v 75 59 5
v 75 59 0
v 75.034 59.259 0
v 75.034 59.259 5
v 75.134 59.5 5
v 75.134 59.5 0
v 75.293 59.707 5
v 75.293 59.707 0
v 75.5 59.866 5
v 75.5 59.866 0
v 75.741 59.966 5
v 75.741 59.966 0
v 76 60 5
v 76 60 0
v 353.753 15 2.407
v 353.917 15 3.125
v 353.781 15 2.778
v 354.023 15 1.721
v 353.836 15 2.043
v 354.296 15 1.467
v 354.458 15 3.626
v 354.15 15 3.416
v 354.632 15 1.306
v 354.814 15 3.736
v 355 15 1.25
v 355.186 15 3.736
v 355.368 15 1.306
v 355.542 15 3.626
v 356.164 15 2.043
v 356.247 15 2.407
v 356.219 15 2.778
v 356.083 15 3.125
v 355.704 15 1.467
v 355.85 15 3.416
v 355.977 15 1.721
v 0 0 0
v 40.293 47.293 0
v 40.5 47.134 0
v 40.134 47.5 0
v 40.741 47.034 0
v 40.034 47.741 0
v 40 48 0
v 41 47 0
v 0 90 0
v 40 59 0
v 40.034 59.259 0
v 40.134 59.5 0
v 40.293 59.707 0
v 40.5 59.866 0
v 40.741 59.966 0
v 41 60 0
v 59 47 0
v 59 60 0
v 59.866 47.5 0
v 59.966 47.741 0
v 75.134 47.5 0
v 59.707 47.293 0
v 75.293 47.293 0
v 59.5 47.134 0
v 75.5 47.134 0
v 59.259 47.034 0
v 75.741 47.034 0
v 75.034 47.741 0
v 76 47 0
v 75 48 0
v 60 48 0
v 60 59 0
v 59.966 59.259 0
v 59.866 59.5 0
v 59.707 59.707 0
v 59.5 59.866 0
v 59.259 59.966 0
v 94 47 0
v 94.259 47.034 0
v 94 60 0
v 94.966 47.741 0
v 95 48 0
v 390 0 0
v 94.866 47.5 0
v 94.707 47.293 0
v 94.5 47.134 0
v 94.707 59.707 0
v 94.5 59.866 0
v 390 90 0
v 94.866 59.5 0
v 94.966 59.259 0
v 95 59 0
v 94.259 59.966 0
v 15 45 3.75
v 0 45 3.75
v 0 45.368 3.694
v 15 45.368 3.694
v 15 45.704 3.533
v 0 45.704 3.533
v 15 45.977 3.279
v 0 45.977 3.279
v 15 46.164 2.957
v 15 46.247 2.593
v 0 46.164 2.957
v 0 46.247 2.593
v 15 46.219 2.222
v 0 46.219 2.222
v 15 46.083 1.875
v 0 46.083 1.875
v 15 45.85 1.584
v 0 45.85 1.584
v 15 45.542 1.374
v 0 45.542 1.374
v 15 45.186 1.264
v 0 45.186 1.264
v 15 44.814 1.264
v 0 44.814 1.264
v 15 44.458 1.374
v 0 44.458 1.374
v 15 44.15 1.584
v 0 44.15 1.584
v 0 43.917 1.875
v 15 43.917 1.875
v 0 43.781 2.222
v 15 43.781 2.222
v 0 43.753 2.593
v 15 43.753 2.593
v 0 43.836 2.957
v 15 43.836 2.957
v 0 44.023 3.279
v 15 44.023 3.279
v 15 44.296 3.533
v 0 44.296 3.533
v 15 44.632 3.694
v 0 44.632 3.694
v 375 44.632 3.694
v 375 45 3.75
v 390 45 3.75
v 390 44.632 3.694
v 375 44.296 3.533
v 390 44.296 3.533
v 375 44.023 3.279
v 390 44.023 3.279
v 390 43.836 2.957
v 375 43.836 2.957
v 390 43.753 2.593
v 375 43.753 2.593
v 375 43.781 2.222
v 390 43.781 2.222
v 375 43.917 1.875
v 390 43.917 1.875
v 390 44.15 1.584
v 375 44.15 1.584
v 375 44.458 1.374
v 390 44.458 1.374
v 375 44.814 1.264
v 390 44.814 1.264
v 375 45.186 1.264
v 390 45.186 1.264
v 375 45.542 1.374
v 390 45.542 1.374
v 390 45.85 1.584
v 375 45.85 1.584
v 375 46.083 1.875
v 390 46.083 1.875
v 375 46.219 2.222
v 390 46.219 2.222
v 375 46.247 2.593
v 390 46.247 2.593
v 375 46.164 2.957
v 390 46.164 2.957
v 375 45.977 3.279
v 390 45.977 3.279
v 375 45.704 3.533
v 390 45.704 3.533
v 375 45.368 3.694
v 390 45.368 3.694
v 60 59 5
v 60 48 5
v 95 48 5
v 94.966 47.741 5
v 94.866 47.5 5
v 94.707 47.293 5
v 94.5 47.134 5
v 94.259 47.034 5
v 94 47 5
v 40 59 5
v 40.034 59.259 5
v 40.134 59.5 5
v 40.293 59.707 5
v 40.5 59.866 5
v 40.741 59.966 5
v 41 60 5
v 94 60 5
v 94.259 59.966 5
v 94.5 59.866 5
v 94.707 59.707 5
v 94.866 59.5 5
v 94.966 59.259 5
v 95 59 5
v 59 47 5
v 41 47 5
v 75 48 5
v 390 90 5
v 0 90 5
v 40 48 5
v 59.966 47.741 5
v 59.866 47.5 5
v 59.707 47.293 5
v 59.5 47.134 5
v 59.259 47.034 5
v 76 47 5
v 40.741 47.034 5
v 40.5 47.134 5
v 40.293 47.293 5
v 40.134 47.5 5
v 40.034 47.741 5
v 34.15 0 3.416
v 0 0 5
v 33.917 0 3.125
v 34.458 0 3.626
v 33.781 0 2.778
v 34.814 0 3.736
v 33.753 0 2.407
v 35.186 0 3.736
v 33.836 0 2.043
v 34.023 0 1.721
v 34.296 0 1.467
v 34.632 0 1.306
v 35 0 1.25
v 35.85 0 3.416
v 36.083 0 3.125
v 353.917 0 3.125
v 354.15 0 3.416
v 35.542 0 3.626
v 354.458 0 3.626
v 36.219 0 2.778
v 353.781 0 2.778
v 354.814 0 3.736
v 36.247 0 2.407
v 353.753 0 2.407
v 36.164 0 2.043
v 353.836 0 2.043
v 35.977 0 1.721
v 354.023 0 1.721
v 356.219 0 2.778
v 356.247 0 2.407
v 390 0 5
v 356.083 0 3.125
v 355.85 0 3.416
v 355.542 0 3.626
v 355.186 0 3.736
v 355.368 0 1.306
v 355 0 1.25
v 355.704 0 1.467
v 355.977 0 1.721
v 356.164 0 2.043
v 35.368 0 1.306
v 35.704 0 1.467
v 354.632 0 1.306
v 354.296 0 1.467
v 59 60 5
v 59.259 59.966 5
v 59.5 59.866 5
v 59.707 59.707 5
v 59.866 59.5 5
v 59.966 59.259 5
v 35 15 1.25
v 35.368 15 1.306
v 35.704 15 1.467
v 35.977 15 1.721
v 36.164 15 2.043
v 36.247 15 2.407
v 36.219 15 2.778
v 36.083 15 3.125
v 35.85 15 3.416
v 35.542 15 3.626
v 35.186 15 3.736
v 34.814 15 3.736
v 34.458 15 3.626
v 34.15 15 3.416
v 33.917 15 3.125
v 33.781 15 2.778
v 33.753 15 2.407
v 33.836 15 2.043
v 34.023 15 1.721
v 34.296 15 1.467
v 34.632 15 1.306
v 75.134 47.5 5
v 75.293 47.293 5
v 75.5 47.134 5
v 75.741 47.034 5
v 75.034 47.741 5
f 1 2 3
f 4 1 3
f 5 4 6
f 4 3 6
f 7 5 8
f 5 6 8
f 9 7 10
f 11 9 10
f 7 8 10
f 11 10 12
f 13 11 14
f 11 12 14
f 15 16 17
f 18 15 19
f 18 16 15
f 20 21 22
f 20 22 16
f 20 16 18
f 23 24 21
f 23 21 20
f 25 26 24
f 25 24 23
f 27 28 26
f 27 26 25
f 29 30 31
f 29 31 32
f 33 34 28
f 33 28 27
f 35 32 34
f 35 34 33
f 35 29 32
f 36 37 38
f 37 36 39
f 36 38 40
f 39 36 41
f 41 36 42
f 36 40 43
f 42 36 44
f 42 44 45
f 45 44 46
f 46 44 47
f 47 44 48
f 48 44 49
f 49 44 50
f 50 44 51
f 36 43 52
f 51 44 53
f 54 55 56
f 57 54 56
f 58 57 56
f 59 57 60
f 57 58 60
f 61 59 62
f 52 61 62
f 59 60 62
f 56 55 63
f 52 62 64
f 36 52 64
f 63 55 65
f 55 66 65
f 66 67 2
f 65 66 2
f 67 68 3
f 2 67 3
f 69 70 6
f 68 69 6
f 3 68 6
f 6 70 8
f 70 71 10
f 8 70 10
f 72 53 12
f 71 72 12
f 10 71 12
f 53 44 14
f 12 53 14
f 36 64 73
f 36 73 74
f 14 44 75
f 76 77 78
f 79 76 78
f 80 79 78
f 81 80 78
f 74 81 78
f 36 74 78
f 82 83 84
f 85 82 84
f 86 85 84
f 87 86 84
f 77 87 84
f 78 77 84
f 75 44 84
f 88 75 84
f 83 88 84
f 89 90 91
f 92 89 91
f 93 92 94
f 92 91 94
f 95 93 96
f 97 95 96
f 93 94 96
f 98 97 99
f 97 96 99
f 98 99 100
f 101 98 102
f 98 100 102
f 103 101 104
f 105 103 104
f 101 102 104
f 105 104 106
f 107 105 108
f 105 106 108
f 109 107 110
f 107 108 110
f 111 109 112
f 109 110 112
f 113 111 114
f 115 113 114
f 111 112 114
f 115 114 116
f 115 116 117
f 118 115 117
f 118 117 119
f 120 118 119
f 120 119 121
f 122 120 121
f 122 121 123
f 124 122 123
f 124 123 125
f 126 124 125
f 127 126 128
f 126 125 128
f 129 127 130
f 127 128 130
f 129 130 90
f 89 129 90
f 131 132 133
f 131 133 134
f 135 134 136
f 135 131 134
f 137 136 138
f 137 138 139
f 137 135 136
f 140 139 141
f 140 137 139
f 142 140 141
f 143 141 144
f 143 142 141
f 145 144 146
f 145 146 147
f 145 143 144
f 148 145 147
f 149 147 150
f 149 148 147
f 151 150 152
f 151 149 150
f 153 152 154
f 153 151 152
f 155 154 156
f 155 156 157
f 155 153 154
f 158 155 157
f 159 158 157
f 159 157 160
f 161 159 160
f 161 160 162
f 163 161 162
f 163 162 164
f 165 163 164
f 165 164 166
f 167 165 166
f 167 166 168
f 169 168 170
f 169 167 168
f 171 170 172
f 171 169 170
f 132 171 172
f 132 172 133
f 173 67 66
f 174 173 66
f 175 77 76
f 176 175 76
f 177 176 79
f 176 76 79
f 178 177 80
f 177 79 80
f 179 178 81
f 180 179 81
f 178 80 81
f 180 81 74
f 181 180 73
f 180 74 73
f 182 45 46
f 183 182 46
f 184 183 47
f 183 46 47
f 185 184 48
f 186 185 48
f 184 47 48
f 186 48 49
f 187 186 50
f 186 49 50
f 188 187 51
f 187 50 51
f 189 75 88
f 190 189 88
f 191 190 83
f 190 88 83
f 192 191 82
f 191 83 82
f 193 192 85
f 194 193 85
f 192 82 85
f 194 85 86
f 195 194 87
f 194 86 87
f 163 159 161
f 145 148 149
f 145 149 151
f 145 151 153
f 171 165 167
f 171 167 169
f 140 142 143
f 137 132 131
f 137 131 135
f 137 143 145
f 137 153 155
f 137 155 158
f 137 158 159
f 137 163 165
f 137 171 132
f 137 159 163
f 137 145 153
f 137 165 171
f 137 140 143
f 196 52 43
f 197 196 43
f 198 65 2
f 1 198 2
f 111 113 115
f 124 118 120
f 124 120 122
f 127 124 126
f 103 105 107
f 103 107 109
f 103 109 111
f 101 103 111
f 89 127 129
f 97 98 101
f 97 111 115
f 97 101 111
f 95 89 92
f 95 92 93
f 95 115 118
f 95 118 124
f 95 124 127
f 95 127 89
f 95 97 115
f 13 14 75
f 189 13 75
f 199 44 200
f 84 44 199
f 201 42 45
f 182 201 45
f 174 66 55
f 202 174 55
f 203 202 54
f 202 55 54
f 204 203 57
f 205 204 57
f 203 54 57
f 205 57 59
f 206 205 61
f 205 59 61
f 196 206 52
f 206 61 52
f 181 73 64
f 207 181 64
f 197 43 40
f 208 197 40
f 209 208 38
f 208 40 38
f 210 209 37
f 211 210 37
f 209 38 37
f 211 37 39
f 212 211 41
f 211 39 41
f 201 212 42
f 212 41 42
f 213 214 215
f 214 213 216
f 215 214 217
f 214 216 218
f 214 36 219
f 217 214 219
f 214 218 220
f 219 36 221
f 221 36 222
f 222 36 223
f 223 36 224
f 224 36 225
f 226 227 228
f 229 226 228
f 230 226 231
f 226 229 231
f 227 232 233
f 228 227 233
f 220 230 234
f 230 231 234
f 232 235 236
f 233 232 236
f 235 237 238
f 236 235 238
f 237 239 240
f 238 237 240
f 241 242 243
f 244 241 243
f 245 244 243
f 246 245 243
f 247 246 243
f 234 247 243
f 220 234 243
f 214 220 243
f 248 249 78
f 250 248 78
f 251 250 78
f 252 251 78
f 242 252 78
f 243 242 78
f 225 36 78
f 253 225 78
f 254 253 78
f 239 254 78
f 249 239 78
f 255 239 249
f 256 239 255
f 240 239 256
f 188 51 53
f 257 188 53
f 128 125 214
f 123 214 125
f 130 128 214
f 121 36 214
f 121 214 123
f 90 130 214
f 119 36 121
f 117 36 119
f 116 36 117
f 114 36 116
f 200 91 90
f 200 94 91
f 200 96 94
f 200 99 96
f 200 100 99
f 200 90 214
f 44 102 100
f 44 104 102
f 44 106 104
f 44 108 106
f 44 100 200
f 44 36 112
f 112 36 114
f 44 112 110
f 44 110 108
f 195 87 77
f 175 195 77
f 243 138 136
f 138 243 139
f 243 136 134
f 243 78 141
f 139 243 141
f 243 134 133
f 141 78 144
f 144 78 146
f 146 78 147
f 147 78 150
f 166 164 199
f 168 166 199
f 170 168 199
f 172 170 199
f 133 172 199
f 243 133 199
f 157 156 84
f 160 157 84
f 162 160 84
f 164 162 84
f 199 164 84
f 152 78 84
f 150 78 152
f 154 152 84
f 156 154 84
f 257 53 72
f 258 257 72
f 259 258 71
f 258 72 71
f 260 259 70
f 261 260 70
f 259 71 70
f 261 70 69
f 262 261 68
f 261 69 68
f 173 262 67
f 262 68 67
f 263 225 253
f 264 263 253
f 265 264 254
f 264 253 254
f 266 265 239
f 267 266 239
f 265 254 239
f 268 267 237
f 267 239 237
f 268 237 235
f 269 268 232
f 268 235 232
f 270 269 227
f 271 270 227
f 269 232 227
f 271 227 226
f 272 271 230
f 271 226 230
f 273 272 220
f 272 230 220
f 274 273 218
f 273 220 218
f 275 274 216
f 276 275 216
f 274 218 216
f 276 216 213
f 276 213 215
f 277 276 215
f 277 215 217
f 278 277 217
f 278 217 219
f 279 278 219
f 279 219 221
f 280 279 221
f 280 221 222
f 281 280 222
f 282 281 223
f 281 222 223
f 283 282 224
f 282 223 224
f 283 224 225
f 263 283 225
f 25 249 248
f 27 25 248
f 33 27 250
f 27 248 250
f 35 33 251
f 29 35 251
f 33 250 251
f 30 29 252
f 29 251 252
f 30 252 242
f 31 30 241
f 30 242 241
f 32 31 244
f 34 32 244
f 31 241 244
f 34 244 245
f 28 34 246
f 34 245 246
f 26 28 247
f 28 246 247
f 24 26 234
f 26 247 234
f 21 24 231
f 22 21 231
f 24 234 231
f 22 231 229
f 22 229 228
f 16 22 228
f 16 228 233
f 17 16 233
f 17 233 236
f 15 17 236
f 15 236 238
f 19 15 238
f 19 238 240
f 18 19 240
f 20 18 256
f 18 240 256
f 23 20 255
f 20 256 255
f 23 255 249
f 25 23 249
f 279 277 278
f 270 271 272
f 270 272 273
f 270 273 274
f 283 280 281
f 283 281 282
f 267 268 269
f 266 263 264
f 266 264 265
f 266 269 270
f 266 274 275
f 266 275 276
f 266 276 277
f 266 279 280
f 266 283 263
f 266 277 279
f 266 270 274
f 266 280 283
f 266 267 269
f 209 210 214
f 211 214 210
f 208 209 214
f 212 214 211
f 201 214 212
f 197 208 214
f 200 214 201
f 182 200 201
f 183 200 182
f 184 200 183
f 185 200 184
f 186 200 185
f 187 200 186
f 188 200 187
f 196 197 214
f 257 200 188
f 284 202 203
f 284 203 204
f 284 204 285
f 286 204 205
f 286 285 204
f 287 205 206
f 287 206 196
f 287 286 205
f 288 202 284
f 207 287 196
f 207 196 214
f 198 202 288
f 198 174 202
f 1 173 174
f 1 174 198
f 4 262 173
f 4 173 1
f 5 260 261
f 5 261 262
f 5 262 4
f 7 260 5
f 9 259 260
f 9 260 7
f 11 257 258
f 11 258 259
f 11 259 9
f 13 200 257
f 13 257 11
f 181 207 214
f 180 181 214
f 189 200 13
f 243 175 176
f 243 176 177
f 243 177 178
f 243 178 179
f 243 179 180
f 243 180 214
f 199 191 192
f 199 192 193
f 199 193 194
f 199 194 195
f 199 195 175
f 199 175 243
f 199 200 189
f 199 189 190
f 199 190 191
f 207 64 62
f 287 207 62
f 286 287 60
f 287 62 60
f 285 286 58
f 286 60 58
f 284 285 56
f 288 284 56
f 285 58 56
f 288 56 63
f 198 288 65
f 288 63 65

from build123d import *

# Parameters (mm, degrees)
SKETCH1_W           = 390
SKETCH1_H           = 90
BOSS_EXTRUDE2_DEPTH = 5
SKETCH2_R           = 1.25
CUT_EXTRUDE1_DEPTH  = 15
CUT_EXTRUDE2_START  = -15
SKETCH3_R           = 1.25
CUT_EXTRUDE2_DEPTH  = 15
SKETCH4_R           = 1.25
CUT_EXTRUDE3_DEPTH  = 15


with BuildPart() as part:
    # Sketch1 → Boss-Extrude2 (new body)
    with BuildSketch(Plane.XY):
        with Locations((195, 45)):
            Rectangle(SKETCH1_W, SKETCH1_H)
        with BuildLine():
            Line((41, 60), (59, 60))
            ThreePointArc((59, 60), (59.707106781, 59.707106781), (60, 59))
            Line((60, 59), (60, 48))
            ThreePointArc((60, 48), (59.707106781, 47.292893219), (59, 47))
            Line((59, 47), (41, 47))
            ThreePointArc((41, 47), (40.292893219, 47.292893219), (40, 48))
            Line((40, 48), (40, 59))
            ThreePointArc((40, 59), (40.292893219, 59.707106781), (41, 60))
        make_face(mode=Mode.SUBTRACT)
        with BuildLine():
            Line((76, 60), (94, 60))
            ThreePointArc((94, 60), (94.707106781, 59.707106781), (95, 59))
            Line((95, 59), (95, 48))
            ThreePointArc((95, 48), (94.707106781, 47.292893219), (94, 47))
            Line((94, 47), (76, 47))
            ThreePointArc((76, 47), (75.292893219, 47.292893219), (75, 48))
            Line((75, 48), (75, 59))
            ThreePointArc((75, 59), (75.292893219, 59.707106781), (76, 60))
        make_face(mode=Mode.SUBTRACT)
    extrude(amount=BOSS_EXTRUDE2_DEPTH)

    # Sketch2 → Cut-Extrude1 (cut)
    with BuildSketch(Plane.ZY):
        with Locations((2.5, 45)):
            Circle(SKETCH2_R)
    extrude(amount=-CUT_EXTRUDE1_DEPTH, mode=Mode.SUBTRACT)

    # Sketch3 → Cut-Extrude2 (cut)
    with BuildSketch(Plane(origin=(390, 0, 0), x_dir=(0, 0, -1), z_dir=(1, 0, 0)).offset(CUT_EXTRUDE2_START)):
        with Locations(Location((-2.5, 45, 0), (0, 0, 180))):
            Circle(SKETCH3_R)
    extrude(amount=CUT_EXTRUDE2_DEPTH, mode=Mode.SUBTRACT)

    # Sketch4 → Cut-Extrude3 (cut)
    with BuildSketch(Plane.XZ):
        with Locations(Location((35, 2.5, 0), (0, 0, 270))):
            Circle(SKETCH4_R)
        with Locations(Location((355, 2.5, 0), (0, 0, 270))):
            Circle(SKETCH4_R)
    extrude(amount=-CUT_EXTRUDE3_DEPTH, mode=Mode.SUBTRACT)


solid = part.part
